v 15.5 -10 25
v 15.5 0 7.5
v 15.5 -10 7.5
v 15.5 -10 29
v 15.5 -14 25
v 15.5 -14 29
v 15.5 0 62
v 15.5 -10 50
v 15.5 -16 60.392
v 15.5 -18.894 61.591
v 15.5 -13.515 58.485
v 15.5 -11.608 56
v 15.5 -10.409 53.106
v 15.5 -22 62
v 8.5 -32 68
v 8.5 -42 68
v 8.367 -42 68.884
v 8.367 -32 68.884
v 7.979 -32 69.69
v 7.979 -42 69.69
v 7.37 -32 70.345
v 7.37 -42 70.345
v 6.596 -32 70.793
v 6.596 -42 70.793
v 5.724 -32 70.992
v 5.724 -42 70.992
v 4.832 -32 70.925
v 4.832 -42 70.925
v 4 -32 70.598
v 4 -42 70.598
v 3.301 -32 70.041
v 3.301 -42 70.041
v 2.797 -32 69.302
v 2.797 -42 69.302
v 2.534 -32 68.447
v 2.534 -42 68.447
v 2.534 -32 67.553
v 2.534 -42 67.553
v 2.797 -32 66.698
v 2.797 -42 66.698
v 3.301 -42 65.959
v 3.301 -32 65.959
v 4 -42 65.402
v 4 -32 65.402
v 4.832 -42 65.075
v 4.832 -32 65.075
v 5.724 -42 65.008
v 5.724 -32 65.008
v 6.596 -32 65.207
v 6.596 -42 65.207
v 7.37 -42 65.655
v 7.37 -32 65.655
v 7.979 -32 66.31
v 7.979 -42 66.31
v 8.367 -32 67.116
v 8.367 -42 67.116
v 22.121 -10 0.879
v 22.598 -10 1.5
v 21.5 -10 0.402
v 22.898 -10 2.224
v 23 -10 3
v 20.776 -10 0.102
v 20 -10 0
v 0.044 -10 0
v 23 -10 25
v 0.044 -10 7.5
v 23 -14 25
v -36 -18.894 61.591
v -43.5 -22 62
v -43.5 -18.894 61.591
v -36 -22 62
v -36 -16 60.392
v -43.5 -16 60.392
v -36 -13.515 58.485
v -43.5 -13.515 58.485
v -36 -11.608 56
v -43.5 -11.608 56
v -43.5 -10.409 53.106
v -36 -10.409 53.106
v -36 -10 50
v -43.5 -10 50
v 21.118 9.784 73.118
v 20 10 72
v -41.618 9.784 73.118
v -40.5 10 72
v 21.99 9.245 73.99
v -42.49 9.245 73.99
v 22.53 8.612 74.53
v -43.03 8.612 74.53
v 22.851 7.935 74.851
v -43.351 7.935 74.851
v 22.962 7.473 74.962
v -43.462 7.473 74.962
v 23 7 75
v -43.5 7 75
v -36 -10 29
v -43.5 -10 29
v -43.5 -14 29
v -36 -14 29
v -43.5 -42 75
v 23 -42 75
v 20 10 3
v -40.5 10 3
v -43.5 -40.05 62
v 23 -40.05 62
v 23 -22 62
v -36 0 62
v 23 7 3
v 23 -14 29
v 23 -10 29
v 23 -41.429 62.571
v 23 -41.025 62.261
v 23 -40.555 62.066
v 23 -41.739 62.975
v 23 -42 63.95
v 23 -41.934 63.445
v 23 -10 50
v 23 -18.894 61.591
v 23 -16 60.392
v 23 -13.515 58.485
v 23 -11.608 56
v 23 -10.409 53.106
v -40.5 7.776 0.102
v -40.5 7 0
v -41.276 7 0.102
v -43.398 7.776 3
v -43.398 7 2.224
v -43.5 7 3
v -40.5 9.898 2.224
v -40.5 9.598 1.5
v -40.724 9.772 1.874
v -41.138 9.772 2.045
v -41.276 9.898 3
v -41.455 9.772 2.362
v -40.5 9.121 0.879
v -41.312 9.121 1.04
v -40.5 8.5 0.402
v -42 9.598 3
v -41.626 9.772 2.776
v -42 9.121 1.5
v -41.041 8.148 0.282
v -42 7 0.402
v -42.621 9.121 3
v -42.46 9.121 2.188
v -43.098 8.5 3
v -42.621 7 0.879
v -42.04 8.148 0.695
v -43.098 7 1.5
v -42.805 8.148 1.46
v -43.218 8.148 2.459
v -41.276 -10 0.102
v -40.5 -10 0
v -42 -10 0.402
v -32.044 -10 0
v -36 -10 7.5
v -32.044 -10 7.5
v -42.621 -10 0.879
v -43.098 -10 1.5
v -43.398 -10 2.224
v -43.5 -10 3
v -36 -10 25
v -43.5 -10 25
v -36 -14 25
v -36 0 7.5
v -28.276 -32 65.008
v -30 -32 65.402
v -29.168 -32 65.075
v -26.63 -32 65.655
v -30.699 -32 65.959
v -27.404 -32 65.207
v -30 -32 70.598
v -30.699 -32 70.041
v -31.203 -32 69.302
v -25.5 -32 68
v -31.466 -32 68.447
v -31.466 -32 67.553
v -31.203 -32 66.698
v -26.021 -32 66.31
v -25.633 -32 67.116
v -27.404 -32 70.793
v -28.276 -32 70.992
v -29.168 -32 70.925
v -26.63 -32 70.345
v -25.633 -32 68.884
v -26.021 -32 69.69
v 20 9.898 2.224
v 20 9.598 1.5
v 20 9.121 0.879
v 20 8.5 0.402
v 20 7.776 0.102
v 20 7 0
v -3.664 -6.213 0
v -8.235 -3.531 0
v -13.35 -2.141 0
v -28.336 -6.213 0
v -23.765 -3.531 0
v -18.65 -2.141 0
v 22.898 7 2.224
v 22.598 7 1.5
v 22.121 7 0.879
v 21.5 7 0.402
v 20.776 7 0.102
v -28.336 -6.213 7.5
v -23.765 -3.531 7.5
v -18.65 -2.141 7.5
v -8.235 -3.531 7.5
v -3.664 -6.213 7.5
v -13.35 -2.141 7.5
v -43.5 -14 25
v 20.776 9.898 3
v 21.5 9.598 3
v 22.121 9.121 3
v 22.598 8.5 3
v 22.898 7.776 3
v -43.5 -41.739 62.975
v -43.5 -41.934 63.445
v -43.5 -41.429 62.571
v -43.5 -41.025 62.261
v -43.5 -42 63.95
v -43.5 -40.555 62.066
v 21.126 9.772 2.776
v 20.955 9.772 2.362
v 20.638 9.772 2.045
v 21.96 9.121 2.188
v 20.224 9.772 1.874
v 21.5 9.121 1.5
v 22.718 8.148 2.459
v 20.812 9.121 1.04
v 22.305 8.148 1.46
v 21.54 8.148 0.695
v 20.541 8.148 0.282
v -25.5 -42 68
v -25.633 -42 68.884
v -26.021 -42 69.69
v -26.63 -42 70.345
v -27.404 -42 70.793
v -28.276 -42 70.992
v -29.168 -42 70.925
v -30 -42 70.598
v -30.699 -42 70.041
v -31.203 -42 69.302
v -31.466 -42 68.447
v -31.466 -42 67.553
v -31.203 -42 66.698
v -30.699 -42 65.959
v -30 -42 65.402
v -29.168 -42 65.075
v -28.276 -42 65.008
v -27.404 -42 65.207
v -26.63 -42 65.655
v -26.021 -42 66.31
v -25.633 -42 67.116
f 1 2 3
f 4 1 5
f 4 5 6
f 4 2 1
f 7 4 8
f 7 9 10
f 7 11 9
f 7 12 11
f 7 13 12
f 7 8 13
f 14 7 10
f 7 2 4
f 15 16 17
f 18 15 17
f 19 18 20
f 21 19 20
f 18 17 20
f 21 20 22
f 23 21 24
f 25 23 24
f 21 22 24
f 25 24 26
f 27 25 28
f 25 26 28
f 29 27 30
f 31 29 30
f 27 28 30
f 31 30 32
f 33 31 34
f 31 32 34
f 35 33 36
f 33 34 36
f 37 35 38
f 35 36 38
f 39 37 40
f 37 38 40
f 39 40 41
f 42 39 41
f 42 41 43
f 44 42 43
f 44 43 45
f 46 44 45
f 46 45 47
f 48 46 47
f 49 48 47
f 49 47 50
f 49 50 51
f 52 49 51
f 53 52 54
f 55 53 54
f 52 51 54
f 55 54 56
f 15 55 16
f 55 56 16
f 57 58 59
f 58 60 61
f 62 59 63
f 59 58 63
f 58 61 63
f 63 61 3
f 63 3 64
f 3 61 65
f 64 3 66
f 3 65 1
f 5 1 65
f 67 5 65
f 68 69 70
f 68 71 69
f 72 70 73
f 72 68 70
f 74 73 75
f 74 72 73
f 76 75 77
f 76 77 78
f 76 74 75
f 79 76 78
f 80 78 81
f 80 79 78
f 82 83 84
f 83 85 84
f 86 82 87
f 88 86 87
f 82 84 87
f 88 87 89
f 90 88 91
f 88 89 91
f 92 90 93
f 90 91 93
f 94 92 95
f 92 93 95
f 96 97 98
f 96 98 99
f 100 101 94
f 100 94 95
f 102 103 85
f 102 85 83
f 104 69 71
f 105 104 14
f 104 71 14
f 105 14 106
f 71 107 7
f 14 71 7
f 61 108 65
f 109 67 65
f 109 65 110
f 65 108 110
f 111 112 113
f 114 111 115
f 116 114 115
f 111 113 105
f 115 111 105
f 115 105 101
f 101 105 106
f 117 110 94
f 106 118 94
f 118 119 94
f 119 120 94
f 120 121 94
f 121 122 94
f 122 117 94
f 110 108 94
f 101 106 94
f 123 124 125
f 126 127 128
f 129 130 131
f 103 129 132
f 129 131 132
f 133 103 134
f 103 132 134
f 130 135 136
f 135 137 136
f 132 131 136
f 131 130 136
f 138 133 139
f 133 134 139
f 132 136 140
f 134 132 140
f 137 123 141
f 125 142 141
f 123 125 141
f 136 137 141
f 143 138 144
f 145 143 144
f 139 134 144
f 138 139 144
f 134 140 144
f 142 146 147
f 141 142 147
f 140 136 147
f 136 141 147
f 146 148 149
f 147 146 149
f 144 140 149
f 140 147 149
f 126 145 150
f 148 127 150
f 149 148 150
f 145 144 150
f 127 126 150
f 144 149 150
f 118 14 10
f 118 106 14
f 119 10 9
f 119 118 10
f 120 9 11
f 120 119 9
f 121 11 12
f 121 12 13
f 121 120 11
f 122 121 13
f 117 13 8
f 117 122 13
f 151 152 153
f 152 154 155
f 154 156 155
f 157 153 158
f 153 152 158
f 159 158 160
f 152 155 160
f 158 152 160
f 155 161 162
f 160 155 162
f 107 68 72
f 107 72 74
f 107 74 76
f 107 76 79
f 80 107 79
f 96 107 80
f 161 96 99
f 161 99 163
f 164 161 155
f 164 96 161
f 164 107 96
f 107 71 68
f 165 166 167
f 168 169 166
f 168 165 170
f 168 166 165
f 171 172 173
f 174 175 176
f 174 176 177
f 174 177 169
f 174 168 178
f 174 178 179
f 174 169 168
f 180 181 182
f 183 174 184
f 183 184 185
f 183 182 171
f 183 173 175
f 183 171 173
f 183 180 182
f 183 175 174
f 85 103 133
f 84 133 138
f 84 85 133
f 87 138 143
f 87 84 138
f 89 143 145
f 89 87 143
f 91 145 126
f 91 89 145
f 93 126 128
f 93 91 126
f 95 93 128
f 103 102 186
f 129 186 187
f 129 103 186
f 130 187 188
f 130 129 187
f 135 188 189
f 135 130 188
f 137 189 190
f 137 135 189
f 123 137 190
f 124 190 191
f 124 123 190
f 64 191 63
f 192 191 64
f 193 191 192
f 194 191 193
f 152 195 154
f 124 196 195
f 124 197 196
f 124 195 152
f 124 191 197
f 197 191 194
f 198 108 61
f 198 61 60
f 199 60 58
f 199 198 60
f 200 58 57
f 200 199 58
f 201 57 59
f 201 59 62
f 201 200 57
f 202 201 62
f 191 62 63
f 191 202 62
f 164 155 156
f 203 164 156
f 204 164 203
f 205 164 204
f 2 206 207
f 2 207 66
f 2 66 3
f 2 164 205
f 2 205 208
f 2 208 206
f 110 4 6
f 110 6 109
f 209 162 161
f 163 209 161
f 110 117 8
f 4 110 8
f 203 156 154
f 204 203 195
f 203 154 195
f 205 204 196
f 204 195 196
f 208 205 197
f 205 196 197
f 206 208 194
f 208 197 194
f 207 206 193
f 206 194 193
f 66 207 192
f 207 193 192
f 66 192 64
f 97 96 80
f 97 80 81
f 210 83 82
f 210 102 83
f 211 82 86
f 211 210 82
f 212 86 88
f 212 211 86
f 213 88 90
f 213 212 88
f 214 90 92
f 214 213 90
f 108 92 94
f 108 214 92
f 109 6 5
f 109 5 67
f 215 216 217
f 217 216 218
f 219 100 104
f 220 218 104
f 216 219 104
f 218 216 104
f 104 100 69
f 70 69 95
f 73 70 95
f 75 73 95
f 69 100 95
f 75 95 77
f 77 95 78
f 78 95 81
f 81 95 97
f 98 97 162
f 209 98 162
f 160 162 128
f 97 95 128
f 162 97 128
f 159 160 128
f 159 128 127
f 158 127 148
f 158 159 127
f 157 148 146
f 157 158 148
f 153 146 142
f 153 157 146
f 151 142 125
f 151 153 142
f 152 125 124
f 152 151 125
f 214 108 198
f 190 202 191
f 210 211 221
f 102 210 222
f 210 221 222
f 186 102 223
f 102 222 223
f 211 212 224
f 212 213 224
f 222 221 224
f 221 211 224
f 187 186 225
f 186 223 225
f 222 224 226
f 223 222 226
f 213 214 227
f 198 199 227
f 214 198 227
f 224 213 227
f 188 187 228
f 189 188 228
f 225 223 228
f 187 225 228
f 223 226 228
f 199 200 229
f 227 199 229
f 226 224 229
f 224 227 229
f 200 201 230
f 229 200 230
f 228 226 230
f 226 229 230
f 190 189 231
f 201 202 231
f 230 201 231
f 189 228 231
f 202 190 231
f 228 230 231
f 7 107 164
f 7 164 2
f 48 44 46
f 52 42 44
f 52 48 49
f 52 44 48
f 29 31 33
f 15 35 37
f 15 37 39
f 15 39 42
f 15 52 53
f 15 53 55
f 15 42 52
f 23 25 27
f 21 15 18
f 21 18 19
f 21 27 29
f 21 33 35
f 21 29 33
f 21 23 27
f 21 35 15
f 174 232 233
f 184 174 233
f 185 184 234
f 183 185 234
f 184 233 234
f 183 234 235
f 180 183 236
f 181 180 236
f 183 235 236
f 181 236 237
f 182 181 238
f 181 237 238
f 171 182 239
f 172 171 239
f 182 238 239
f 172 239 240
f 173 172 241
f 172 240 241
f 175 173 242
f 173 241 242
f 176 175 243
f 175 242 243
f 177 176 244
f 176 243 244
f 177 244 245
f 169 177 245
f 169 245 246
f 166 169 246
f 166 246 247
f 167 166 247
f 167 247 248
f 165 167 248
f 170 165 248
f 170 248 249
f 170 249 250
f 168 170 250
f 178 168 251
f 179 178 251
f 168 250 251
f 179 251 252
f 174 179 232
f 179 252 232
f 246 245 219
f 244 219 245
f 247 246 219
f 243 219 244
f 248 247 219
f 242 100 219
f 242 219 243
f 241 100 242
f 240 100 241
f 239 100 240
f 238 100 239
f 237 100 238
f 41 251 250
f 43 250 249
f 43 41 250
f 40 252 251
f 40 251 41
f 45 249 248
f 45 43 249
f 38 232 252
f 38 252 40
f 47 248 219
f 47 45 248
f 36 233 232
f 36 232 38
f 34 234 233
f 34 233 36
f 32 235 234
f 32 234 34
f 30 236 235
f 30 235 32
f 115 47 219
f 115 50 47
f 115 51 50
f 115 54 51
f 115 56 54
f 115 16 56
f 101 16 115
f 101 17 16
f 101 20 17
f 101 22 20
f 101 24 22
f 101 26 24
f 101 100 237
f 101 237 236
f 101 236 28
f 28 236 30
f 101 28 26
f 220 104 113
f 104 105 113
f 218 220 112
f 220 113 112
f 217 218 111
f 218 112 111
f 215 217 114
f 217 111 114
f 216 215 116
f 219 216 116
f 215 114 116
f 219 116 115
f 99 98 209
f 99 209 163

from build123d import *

# Parameters (mm, degrees)
BOSS_EXTRUDE1_DEPTH      = 10
BOSS_EXTRUDE2_DEPTH      = 42
BOSS_EXTRUDE2_DEPTH_BACK = 10
BOSS_EXTRUDE3_DEPTH      = 10
SKETCH3_R                = 20.035
CUT_EXTRUDE2_DEPTH       = 10
FILLET1_R                = 12
SKETCH9_W                = 7.5
SKETCH9_H                = 4
BOSS_EXTRUDE5_DEPTH      = 4
FILLET4_R                = 1.95
FILLET5_R                = 3
FILLET6_R                = 3
SKETCH10_R               = 3
CUT_EXTRUDE3_DEPTH       = 10


with BuildPart() as part:
    # Sketch1 → Boss-Extrude1 (new body)
    with BuildSketch(Plane(origin=(0, 0, 0), x_dir=(1, 0, 0), z_dir=(0, 1, 0))):
        Polygon((0, 0), (-43.5, 0), (-43.5, -68), (23, -68), (23, 0), align=None)
    extrude(amount=BOSS_EXTRUDE1_DEPTH)

    # Sketch2 → Boss-Extrude2 (add, two sides)
    with BuildSketch(Plane.XZ) as boss_extrude2_sk:
        Polygon((-43.5, 68), (-43.5, 62), (23, 62), (23, 68), (23, 75), (-43.5, 75), align=None)
    extrude(amount=BOSS_EXTRUDE2_DEPTH)
    extrude(boss_extrude2_sk.sketch, amount=-BOSS_EXTRUDE2_DEPTH_BACK)

    # Sketch4 → Boss-Extrude3 (add)
    with BuildSketch(Plane.XZ):
        Polygon((-43.5, 62), (-36, 62), (-36, 7.5), (15.5, 7.5), (15.5, 62), (23, 62), (23, 0), (-43.5, 0), align=None)
    extrude(amount=BOSS_EXTRUDE3_DEPTH)

    # Sketch3 → Cut-Extrude2 (cut)
    with BuildSketch(Plane(origin=(0, 0, 0), x_dir=(-1, 0, 0), z_dir=(0, 0, -1))):
        with Locations((16, -22)):
            Circle(SKETCH3_R)
    extrude(amount=-CUT_EXTRUDE2_DEPTH, mode=Mode.SUBTRACT)

    # Fillet1
    fillet1_edges = [part.edges().sort_by_distance(p)[0] for p in [
        (19.25, -10, 62),
        (-39.75, -10, 62),
    ]]
    fillet(fillet1_edges, radius=FILLET1_R)

    # Sketch9 → Boss-Extrude5 (add)
    with BuildSketch(Plane.XZ.offset(10)):
        with Locations((-39.75, 27)):
            Rectangle(SKETCH9_W, SKETCH9_H)
        with Locations((19.25, 27)):
            Rectangle(SKETCH9_W, SKETCH9_H)
    extrude(amount=BOSS_EXTRUDE5_DEPTH)

    # Fillet4
    fillet4_edges = [part.edges().sort_by_distance(p)[0] for p in [
        (-10.25, -42, 62),
    ]]
    fillet(fillet4_edges, radius=FILLET4_R)

    # Fillet5
    fillet5_edges = [part.edges().sort_by_distance(p)[0] for p in [
        (23, 0, 0),
        (-43.5, 0, 0),
    ]]
    fillet(fillet5_edges, radius=FILLET5_R)

    # Fillet6
    fillet6_edges = [part.edges().sort_by_distance(p)[0] for p in [
        (-10.25, 10, 0),
        (-43.5, 10, 39),
        (-42.621320344, 10, 0.878679656),
        (22.121320344, 10, 0.878679656),
        (23, 10, 39),
        (-10.25, 10, 75),
    ]]
    fillet(fillet6_edges, radius=FILLET6_R)

    # Sketch10 → Cut-Extrude3 (cut)
    with BuildSketch(Plane.XZ.offset(42)):
        with Locations((-28.5, 68)):
            Circle(SKETCH10_R)
        with Locations((5.5, 68)):
            Circle(SKETCH10_R)
    extrude(amount=-CUT_EXTRUDE3_DEPTH, mode=Mode.SUBTRACT)


solid = part.part
